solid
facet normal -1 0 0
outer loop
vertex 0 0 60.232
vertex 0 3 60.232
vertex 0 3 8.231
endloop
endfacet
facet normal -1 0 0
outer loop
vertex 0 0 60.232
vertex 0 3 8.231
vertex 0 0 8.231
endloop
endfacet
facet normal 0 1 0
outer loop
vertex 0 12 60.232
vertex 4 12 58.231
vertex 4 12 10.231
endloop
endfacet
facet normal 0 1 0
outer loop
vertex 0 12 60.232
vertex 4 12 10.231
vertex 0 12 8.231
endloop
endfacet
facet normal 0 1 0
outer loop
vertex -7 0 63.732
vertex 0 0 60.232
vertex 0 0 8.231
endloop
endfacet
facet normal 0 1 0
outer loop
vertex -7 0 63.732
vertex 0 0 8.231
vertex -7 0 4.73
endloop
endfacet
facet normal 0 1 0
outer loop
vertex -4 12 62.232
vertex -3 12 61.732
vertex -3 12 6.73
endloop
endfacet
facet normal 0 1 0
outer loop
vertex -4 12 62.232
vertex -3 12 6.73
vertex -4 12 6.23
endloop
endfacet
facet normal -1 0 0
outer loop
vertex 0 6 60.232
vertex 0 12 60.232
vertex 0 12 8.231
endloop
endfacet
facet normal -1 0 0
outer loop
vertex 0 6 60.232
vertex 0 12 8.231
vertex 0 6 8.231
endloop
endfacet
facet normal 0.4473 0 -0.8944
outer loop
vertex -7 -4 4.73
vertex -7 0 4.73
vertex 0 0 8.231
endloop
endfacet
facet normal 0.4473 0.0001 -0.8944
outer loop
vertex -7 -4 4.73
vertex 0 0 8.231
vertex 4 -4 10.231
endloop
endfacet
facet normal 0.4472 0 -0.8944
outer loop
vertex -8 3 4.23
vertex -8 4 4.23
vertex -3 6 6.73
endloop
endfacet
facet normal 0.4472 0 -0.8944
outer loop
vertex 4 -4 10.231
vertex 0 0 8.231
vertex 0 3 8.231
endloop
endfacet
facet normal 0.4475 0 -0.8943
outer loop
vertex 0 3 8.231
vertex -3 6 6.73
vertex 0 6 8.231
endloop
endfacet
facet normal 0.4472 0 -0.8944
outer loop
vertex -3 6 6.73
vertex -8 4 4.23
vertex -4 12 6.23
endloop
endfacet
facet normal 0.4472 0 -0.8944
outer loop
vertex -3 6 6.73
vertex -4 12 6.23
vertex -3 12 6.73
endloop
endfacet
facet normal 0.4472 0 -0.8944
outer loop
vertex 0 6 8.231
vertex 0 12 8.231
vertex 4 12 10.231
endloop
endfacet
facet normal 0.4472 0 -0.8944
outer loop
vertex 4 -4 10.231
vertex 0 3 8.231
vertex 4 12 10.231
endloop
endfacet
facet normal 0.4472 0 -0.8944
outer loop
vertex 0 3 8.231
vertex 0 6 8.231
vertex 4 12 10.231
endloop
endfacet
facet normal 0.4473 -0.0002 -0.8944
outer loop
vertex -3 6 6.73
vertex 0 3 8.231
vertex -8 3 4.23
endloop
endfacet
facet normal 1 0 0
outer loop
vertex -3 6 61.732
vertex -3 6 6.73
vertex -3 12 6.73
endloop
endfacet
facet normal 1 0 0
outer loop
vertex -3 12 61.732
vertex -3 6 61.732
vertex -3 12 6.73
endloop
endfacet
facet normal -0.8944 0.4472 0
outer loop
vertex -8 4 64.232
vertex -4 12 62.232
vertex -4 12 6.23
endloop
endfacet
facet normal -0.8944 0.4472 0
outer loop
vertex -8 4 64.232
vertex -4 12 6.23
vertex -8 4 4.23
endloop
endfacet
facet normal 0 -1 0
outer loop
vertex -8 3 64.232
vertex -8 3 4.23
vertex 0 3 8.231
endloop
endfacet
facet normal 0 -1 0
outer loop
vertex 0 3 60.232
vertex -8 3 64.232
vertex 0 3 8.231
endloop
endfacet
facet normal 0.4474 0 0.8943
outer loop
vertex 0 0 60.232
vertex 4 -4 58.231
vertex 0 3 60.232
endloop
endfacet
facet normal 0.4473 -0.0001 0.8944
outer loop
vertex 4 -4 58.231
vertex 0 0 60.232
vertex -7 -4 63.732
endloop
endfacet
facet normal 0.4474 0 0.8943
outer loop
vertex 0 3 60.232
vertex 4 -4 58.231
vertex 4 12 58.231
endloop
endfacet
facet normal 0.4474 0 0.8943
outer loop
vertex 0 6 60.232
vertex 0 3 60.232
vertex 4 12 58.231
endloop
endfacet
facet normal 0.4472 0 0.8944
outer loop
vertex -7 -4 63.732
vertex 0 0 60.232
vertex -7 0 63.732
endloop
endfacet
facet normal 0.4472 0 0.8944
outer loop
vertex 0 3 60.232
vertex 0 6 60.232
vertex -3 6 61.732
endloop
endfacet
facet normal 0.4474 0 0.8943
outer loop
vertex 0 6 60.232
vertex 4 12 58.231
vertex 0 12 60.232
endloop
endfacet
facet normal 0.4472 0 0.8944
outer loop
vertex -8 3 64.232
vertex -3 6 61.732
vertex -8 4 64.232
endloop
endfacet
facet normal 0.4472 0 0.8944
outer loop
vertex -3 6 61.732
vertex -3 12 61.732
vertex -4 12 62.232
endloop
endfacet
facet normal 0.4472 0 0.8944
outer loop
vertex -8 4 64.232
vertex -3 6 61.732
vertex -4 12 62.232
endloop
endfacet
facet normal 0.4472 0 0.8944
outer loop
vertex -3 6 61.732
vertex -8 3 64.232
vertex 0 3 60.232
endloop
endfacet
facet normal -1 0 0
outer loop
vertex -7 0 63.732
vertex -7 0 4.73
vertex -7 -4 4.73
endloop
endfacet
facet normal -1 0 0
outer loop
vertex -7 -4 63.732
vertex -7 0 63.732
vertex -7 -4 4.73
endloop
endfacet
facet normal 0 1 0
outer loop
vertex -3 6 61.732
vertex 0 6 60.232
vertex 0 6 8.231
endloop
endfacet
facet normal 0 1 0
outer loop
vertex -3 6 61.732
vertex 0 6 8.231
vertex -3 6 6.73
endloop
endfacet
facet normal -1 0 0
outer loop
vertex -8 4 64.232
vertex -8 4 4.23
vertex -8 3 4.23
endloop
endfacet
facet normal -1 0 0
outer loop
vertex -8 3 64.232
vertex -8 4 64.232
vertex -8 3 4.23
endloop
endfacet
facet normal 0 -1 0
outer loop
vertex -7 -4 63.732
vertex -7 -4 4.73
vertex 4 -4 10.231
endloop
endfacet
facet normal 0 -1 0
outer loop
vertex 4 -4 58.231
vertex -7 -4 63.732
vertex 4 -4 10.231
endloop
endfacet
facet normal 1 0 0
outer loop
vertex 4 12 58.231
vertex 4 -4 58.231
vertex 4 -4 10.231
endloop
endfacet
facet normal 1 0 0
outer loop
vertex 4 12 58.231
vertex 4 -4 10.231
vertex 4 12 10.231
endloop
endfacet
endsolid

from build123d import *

# Parameters (mm, degrees)
DODANIE_WYCI_GNI_CIE1_DEPTH = 70
SZKIC2_OUTSIDE_W            = 28.56
SZKIC2_OUTSIDE_H            = 86.56
WYTNIJ_WYCI_GNI_CIE1_DEPTH  = 73.249567473


with BuildPart() as part:
    # Szkic1 → Dodanie-wyciągnięcie1 (new body)
    with BuildSketch(Plane.XY):
        Polygon((0, 0), (-7, 0), (-7, -4), (-0.506849315, -4), (4, -4), (4, 12), (0, 12), (0, 6), (-3, 6), (-3, 12), (-4, 12), (-8, 4), (-8, 3), (0, 3), align=None)
    extrude(amount=DODANIE_WYCI_GNI_CIE1_DEPTH)

    # Szkic2 outside → Wytnij-wyciągnięcie1 (cut, through all)
    with BuildSketch(Plane(origin=(0, 12, 0), x_dir=(1, 0, 0), z_dir=(0, 1, 0))):
        with Locations((-2, -35)):
            Rectangle(SZKIC2_OUTSIDE_W, SZKIC2_OUTSIDE_H)
        Polygon((-15.924171966, -0.266842792), (4, -10.231080013), (4, -58.231080013), (-15.924171966, -68.195317233), align=None, mode=Mode.SUBTRACT)
    extrude(amount=-WYTNIJ_WYCI_GNI_CIE1_DEPTH, mode=Mode.SUBTRACT)


solid = part.part
